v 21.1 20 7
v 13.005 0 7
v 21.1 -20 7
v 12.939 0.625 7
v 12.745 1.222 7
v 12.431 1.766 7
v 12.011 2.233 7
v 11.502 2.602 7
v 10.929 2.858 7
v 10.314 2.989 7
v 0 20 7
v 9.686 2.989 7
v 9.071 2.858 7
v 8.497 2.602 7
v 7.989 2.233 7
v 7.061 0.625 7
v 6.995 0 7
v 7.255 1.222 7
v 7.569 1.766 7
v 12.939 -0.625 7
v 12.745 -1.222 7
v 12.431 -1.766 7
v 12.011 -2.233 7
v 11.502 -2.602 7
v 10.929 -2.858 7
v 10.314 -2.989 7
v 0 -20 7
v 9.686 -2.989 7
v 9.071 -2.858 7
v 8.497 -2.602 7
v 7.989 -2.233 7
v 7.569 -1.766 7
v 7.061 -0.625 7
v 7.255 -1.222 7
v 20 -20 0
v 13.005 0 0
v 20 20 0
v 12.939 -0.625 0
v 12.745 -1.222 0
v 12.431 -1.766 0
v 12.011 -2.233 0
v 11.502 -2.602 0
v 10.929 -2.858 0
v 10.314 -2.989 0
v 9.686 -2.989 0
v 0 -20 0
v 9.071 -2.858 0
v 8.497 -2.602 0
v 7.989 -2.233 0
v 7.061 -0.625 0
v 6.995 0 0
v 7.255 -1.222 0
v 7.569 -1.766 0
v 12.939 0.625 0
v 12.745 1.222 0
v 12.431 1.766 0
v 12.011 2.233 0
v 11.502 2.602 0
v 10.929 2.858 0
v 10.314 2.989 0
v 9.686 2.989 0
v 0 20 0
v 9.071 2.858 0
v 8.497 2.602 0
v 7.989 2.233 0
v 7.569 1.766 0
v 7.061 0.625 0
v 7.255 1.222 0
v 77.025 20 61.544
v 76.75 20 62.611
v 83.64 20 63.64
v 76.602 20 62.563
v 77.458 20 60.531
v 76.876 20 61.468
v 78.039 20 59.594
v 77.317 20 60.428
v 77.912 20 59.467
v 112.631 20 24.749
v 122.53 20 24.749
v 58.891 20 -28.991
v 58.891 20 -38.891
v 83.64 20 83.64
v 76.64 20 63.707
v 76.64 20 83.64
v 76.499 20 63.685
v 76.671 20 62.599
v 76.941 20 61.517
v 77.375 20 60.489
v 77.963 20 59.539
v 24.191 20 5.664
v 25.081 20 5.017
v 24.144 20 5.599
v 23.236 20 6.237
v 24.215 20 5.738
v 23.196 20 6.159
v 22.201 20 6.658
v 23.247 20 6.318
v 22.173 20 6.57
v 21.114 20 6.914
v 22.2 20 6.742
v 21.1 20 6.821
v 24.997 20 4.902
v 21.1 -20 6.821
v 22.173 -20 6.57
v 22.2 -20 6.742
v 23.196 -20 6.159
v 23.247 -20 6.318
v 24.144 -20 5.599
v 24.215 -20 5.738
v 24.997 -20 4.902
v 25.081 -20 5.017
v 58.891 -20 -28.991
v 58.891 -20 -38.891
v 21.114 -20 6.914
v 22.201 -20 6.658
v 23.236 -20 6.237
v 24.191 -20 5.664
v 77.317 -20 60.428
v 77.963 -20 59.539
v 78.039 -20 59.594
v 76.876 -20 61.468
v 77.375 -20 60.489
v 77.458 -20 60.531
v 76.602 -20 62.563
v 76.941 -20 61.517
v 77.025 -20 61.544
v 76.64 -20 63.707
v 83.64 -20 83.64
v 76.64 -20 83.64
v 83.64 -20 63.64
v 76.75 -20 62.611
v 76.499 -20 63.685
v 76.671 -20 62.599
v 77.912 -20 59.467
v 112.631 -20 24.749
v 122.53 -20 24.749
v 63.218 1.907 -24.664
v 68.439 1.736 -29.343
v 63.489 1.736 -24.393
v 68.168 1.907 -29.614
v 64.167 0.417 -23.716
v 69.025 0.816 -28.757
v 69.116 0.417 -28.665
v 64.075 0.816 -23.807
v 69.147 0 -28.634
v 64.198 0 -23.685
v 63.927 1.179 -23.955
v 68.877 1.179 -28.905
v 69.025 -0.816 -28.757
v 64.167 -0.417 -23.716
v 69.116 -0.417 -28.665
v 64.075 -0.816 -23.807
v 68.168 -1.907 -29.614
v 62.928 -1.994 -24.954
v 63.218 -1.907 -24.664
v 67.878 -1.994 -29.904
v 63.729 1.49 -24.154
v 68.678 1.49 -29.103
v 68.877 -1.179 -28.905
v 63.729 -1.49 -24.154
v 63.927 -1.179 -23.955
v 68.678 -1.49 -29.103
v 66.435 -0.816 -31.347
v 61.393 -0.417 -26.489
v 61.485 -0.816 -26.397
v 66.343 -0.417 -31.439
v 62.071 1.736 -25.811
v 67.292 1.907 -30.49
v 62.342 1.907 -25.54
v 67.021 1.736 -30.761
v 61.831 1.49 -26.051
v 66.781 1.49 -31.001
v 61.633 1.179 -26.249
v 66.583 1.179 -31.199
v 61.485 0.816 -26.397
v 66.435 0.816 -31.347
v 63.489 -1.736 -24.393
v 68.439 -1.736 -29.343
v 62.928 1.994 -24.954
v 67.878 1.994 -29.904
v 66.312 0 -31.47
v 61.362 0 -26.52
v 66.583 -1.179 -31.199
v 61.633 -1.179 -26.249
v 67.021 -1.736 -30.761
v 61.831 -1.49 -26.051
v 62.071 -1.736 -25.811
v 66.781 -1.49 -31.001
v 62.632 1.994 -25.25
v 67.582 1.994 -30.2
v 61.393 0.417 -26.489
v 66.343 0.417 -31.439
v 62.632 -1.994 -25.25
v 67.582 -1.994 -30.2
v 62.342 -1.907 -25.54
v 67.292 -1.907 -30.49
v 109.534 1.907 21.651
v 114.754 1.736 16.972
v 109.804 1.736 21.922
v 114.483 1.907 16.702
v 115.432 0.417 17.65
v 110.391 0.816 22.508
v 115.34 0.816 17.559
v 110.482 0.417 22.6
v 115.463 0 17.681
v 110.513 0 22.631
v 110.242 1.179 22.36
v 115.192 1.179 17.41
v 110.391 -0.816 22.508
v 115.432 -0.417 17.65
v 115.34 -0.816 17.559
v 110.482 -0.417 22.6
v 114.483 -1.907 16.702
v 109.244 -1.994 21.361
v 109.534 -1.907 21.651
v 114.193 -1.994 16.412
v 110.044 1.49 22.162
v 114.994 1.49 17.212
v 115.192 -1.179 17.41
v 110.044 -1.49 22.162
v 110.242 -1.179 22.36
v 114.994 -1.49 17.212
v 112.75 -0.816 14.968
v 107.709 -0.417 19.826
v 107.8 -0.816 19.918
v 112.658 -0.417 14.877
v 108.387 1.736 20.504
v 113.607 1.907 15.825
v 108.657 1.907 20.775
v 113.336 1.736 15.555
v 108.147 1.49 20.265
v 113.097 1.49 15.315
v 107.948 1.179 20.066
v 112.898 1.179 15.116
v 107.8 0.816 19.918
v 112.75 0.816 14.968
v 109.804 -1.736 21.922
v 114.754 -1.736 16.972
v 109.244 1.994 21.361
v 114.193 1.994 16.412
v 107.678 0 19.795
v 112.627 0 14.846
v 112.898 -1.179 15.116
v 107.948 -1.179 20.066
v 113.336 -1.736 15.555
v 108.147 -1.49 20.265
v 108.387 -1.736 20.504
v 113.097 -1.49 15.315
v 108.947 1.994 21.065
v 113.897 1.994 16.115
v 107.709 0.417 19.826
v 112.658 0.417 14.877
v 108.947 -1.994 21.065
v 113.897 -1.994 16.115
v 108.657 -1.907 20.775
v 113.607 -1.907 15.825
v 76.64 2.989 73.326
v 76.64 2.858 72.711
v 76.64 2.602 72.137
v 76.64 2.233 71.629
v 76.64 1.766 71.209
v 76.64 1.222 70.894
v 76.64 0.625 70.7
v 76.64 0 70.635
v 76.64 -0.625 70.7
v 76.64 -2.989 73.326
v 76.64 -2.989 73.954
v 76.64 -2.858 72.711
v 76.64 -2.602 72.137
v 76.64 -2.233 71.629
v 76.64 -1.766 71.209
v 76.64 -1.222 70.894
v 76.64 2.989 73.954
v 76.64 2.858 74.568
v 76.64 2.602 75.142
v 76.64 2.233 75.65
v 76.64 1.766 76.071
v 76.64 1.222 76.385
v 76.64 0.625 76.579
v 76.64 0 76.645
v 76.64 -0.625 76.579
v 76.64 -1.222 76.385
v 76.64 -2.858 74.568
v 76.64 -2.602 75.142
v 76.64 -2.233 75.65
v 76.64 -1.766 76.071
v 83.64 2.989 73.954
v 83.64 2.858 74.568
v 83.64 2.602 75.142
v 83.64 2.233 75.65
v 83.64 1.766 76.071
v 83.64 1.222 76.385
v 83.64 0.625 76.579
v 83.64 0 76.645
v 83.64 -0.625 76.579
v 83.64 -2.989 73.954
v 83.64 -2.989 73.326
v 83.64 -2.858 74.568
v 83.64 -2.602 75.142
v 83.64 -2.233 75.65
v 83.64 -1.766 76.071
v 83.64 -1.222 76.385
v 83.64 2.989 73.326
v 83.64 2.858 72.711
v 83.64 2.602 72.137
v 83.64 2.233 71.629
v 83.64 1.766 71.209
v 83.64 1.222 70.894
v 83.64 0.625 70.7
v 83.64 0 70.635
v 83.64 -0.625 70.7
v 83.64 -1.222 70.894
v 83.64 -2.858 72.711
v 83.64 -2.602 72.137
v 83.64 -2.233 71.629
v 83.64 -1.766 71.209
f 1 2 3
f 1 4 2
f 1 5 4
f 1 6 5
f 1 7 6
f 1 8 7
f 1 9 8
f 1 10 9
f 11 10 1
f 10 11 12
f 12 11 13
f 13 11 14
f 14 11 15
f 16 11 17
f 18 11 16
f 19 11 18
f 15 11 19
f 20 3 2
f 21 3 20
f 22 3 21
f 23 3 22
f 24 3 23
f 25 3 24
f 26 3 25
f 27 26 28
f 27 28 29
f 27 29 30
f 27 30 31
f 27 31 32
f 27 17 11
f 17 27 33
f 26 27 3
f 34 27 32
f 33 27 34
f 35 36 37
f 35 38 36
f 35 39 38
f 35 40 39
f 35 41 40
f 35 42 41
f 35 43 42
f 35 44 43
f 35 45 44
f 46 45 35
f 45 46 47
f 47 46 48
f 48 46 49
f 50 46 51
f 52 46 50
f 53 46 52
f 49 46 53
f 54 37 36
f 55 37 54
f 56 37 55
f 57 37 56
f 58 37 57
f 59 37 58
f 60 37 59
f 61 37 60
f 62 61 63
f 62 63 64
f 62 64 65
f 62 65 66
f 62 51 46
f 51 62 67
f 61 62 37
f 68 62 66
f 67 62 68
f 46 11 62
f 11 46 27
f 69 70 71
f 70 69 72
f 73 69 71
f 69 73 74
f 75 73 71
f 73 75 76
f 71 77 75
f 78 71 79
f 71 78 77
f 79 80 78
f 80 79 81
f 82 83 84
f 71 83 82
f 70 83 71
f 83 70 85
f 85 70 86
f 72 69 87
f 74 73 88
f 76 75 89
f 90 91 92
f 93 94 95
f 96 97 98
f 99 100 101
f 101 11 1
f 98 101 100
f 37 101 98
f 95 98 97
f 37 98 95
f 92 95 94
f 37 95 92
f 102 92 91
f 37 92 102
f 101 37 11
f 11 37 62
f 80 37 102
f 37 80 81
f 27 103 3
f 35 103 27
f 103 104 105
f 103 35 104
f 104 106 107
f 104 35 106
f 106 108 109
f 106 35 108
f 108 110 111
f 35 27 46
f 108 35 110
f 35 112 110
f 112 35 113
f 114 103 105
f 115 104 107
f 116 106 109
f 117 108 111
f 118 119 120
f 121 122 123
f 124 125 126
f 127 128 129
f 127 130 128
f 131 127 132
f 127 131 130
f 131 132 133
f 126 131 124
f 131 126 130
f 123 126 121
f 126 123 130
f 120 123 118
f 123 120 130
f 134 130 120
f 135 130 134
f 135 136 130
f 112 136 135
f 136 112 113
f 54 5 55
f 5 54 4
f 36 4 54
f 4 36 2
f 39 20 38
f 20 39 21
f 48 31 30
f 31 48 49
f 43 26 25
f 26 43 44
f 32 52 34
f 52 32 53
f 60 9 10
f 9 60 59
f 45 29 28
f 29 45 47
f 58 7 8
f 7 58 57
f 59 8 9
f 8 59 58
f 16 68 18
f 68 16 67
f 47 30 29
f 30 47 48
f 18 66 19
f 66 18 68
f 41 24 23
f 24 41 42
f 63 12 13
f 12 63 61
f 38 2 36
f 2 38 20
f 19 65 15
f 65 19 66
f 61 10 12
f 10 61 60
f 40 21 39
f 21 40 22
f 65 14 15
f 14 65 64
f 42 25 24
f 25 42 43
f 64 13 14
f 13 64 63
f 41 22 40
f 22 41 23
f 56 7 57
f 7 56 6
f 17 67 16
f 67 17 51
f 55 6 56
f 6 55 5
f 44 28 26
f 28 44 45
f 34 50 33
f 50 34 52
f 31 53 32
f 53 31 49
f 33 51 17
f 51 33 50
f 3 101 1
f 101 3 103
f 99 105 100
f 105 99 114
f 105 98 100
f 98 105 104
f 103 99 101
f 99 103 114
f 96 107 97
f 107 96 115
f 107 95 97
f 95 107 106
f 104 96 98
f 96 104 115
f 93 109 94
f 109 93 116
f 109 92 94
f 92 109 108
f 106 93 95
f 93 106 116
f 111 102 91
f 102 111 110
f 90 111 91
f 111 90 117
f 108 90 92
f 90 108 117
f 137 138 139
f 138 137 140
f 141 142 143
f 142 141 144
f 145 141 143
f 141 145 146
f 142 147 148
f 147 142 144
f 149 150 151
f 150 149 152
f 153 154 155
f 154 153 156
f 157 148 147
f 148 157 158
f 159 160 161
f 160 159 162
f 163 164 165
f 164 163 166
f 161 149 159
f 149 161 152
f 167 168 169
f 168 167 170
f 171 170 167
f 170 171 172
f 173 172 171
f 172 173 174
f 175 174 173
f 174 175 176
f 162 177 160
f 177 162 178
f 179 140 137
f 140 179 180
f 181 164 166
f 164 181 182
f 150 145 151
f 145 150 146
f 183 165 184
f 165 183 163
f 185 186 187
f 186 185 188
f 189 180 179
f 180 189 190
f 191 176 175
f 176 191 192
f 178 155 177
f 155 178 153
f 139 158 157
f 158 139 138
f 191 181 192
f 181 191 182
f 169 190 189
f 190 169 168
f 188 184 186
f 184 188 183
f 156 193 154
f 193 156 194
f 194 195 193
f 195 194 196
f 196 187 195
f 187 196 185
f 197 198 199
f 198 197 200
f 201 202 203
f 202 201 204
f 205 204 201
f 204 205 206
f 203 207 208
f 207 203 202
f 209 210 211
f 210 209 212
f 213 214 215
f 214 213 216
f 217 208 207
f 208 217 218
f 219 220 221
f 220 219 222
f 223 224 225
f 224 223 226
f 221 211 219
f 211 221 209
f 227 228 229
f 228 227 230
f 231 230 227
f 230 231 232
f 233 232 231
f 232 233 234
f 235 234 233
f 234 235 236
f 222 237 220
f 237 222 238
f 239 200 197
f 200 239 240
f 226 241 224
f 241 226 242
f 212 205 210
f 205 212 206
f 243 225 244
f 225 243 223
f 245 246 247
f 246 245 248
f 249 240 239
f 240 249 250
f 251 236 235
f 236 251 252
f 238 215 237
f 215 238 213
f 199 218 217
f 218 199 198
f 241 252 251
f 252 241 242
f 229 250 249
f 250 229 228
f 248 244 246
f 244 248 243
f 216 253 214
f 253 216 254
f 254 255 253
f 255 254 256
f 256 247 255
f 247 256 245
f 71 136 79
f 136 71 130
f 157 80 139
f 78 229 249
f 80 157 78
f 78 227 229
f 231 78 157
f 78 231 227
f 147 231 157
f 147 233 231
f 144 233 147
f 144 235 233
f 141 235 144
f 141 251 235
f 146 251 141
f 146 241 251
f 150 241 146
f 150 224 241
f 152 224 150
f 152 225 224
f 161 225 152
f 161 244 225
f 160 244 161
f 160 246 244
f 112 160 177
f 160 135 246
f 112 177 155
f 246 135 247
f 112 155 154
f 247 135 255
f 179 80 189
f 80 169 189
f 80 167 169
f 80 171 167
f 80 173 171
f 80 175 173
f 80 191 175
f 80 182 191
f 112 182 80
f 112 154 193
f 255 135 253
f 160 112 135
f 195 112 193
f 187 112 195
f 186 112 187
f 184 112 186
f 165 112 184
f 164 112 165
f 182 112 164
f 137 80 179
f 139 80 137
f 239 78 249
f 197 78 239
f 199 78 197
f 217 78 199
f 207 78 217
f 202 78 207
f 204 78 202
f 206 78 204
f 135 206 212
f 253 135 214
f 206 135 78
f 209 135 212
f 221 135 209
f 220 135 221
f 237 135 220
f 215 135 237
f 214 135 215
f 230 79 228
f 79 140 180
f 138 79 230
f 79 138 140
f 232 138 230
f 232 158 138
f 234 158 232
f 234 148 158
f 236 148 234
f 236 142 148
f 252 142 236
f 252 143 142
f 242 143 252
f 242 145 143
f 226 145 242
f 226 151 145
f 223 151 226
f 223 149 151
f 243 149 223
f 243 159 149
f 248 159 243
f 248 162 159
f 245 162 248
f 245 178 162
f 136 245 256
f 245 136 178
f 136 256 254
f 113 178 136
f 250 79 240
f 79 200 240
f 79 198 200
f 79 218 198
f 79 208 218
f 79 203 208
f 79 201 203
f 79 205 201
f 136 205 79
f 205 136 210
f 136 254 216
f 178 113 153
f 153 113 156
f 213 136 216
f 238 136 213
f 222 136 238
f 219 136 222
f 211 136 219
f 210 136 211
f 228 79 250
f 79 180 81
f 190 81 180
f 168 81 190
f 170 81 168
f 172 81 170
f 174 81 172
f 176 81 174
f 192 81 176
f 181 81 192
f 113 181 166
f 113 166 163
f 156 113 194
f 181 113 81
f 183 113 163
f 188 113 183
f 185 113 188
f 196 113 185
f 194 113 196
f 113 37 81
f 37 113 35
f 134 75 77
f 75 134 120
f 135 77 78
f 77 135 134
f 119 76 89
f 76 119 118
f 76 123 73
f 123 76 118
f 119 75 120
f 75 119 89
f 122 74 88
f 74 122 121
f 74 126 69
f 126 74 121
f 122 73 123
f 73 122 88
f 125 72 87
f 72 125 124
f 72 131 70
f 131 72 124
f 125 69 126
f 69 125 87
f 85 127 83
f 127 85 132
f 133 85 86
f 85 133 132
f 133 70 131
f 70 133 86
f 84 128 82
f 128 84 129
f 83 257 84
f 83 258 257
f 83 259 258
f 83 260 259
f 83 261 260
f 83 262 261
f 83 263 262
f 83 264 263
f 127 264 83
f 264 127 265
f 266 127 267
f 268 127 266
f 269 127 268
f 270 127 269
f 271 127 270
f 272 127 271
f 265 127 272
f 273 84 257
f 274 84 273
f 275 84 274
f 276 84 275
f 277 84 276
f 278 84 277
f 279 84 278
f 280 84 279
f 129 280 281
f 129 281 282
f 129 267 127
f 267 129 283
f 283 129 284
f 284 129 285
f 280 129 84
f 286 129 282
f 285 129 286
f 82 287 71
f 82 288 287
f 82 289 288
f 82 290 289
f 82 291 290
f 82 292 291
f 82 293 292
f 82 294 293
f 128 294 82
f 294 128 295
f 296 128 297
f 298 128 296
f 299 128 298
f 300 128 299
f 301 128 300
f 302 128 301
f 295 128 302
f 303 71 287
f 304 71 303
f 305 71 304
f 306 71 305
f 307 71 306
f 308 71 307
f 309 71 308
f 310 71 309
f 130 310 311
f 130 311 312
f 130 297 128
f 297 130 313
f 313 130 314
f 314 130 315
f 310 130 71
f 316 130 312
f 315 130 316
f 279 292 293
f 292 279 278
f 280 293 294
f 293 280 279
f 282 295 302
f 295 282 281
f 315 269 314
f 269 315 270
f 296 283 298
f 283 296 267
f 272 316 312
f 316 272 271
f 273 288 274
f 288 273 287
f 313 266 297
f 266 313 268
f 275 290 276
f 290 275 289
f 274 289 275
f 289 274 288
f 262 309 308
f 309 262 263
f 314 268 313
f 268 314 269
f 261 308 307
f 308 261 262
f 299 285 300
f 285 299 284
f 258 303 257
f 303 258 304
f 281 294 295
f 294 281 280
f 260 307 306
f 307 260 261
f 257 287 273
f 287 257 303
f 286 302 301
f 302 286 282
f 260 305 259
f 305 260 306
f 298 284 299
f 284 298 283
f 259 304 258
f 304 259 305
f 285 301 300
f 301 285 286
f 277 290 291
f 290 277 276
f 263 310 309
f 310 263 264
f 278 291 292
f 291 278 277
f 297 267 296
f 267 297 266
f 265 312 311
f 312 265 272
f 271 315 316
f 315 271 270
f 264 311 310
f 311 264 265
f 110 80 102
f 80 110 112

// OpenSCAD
// file: bent_bar_with_holes.scad
// === bent_bar_with_holes.scad ===
// Librairie OpenSCAD modulaire pour modéliser une barre pliée avec perçages personnalisés

// === MODULE SEGMENT ===
module segment(len, bar_width, bar_thickness) {
    translate([0, -bar_width / 2, 0])
        cube([len, bar_width, bar_thickness]);
}

// === MODULE ARC POLYGONAL ===
module arc_bridge(angle_total, radius, width, thickness, steps) {
    angle_step = angle_total / steps;
    arc_len = radius * angle_step * PI / 180;

    for (i = [0 : steps - 1]) {
        rot = angle_step * i;
        translate([radius * sin(rot * PI / 180), 0, radius * (1 - cos(rot * PI / 180))])
            rotate([0, rot, 0])
                translate([0, -width / 2, 0])
                    cube([arc_len, width, thickness]);
    }
}

// === MODULE TROU GÉNÉRIQUE ===
// pos = [x, y] relatif au coin inférieur avant gauche du segment
module hole(d, pos, axis, bar_width, bar_thickness, len_seg) {
    if (axis == "Y") {
        translate([pos[0], 0, pos[1]])
            rotate([90, 0, 0])
                cylinder(d=d, h=bar_width + 1, center=true);
    }
    else if (axis == "Z") {
        translate([pos[0], pos[1] - bar_width / 2, -0.01])
            cylinder(d=d, h=bar_thickness + 0.02, center=false);
    }
}

// === FONCTION POUR EXTRAIRE LES TROUS CIBLÉS D'UN SEGMENT ===
function holes_for_segment(holes, index) = [ for (h = holes) if (h[0] == index) h ];

// === MODULE PRINCIPAL DE CONSTRUCTION ===
module bent_bar(sequence, holes = [], bar_width=20, bar_thickness=5, arc_radius=5, arc_steps=9) {
    bent_bar_internal(sequence, holes, bar_width, bar_thickness, arc_radius, arc_steps, 0);
}

module bent_bar_internal(seq, holes, bar_width, bar_thickness, arc_radius, arc_steps, i = 0) {
    if (i < len(seq)) {
        len_seg = seq[i][0];
        bend_angle = seq[i][1];

        union() {
            let (segment_holes = holes_for_segment(holes, i))
                if (len(segment_holes) > 0) {
                    difference() {
                        segment(len_seg, bar_width, bar_thickness);
                        for (h = segment_holes)
                            hole(h[2], h[1], h[3], bar_width, bar_thickness, len_seg);
                    }
                } else {
                    segment(len_seg, bar_width, bar_thickness);
                }

            if (bend_angle != 0 &&
                abs(bend_angle) % 90 != 0 &&
                abs(bend_angle) % 180 != 0) {
                translate([len_seg, 0, 0])
                    rotate([0, bend_angle > 0 ? 0 : 180, 0])
                        arc_bridge(abs(bend_angle), arc_radius, bar_width, bar_thickness, arc_steps);
            }

            translate([len_seg, 0, 0])
                rotate([0, bend_angle, 0])
                    bent_bar_internal(seq, holes, bar_width, bar_thickness, arc_radius, arc_steps, i + 1);
        }
    }
}
bend_sequence = [
  [30, 45],
  [40, -90],
  [30, 0]
];

holes = [
  [0, [5, 5], 2, "Z"],
  [1, [10, 0], 2, "Y"],
  [2, [5, 5], 2, "Z"]
];

bent_bar(
  bend_sequence,
  holes,
  bar_width = 25,
  bar_thickness = 4,
  arc_radius = 4,
  arc_steps = 10
);
// main file
use <bent_bar_with_holes.scad>
// === AFFICHAGE
bend_sequence = [
  [20, 45],
  [55, -90],
  [90, -90],
  [55, 45],
  [20, 0]
];
holes = [
  [0, [10, 20], 6.01, "Z"],
  [4, [10, 20], 6.01, "Z"],
  [2, [12.5, 20], 4.01, "Z"],
  [2, [78, 20], 4.01, "Z"]
];
$fn = 30;
bent_bar(
  bend_sequence,
  holes,
  bar_width = 40,
  bar_thickness = 7,
  arc_radius = 7,
  arc_steps = 5
);
